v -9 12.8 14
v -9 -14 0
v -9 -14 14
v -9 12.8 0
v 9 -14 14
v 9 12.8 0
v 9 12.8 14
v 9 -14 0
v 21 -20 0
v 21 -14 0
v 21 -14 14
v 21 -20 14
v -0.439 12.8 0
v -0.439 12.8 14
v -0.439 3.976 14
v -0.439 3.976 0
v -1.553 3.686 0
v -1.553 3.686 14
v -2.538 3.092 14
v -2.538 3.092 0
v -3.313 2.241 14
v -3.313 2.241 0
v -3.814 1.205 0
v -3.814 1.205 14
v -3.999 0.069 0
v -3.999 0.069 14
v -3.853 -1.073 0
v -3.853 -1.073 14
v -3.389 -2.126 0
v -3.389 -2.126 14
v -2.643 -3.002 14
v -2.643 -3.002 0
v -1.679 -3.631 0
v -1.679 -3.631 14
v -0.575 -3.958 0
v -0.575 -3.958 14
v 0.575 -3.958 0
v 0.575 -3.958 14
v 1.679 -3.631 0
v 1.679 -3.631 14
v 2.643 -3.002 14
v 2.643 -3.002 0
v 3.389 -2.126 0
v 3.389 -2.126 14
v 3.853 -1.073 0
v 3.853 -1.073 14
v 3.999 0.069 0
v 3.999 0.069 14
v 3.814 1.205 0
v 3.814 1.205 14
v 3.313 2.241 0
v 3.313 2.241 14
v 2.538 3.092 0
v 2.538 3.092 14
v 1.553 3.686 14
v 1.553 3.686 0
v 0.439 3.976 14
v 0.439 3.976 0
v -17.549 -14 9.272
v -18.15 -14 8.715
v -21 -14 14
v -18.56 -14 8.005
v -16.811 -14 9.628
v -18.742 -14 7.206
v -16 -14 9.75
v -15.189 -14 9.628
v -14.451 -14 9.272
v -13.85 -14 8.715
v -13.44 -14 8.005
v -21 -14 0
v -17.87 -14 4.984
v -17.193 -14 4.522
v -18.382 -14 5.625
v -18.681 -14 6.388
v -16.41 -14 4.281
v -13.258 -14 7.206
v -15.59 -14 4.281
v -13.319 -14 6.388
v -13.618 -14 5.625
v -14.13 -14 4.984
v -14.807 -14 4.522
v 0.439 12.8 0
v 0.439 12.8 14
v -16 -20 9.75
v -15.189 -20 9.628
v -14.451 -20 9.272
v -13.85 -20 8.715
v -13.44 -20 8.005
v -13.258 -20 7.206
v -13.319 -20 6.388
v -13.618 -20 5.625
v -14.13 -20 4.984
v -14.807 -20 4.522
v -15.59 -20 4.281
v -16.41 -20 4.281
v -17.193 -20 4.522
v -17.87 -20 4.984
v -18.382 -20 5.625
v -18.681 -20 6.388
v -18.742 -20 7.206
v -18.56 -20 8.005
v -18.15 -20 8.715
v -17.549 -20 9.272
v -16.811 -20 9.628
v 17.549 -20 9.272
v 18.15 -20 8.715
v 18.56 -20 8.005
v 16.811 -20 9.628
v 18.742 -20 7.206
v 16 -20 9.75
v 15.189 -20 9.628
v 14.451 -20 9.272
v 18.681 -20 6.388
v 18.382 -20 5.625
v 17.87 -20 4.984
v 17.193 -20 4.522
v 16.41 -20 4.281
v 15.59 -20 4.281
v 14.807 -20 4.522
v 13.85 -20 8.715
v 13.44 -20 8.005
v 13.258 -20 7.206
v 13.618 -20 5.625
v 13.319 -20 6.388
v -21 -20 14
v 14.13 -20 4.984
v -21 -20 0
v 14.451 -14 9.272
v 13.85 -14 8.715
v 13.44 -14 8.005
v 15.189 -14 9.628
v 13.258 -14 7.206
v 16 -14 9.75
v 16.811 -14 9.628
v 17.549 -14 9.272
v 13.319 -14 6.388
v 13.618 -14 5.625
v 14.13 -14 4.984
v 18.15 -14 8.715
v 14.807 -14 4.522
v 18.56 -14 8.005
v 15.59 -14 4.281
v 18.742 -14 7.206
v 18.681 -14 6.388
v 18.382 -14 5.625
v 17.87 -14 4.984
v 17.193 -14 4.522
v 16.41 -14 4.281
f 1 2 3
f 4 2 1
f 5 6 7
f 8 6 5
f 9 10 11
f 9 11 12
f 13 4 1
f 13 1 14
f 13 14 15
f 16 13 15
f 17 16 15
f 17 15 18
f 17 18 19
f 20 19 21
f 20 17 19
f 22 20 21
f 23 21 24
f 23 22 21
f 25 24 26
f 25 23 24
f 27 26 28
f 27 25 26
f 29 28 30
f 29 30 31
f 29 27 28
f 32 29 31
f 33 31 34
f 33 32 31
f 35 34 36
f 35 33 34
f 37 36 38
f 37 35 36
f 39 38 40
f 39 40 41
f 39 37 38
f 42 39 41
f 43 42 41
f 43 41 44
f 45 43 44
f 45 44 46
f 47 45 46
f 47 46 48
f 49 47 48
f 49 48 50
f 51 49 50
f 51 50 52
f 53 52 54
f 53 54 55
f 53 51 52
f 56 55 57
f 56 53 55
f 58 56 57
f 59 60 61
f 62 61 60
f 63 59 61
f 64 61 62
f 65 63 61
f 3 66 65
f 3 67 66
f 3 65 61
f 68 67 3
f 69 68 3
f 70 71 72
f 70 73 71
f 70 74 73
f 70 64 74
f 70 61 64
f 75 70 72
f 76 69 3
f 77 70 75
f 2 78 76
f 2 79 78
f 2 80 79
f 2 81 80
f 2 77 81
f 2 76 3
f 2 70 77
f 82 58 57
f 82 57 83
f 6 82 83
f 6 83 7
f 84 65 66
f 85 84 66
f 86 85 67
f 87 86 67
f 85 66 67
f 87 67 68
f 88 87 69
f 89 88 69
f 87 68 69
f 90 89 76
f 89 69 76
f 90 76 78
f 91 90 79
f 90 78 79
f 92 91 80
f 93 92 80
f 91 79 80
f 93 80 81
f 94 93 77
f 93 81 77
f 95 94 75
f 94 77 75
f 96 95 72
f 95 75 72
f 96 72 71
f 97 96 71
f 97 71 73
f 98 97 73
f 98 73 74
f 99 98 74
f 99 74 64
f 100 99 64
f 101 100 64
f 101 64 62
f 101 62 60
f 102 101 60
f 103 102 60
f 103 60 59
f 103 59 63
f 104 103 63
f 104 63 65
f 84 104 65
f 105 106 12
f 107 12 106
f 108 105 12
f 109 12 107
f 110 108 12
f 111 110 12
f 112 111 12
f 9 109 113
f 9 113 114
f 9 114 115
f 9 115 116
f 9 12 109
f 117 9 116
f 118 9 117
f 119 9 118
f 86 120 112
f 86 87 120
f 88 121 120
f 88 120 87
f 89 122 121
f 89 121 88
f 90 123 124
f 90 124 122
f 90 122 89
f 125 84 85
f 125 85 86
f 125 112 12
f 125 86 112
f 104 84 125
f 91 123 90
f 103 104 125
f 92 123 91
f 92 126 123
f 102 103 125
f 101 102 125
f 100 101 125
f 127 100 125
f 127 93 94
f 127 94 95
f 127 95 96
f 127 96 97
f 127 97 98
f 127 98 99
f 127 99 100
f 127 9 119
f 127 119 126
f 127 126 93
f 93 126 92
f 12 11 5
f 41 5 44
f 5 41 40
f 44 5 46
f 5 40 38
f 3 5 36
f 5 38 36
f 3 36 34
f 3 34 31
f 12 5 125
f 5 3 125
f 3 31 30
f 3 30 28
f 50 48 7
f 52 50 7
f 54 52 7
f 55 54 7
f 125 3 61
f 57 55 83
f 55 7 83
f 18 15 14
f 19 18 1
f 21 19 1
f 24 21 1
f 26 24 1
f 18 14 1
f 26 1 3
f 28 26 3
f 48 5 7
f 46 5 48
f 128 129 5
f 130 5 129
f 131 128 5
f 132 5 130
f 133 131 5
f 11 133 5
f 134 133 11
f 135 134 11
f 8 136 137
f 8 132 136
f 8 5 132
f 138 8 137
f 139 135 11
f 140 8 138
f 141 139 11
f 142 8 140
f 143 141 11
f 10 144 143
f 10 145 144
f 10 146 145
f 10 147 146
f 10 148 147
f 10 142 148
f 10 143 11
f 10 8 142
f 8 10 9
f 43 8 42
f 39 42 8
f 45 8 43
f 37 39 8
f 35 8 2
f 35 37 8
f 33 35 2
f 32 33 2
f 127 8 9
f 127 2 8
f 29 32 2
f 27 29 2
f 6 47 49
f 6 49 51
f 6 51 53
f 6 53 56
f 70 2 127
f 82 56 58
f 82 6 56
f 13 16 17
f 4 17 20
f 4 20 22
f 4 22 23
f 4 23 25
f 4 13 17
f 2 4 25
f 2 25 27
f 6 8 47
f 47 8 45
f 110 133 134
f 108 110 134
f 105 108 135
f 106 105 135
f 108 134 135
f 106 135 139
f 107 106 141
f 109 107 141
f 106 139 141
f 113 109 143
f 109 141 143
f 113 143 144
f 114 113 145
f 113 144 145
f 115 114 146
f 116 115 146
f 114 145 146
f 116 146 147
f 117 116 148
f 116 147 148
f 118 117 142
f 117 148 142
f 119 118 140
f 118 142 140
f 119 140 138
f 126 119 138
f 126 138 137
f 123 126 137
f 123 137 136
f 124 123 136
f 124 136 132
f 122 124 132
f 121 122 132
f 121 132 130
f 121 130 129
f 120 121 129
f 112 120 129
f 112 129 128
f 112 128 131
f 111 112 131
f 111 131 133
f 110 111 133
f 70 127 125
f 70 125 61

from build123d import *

# Parameters (mm, degrees)
EXTRUDE_2_DEPTH     = 14
SKETCH_2_R          = 2.75
CUT_EXTRUDE_1_DEPTH = 37.813584449


with BuildPart() as part:
    # 草图1 → 凸台-拉伸2 (new body)
    with BuildSketch(Plane.XY):
        with BuildLine():
            Line((21, -20), (-21, -20))
            Line((-21, -20), (-21, -14))
            Line((-21, -14), (-9, -14))
            Line((-9, -14), (-9, 12.8))
            Line((-9, 12.8), (-0.438791817, 12.8))
            Line((-0.438791817, 12.8), (-0.438791817, 3.975859874))
            ThreePointArc((-0.438791817, 3.975859874), (0, -4), (0.438791817, 3.975859874))
            Line((0.438791817, 3.975859874), (0.438791817, 12.8))
            Line((0.438791817, 12.8), (9, 12.8))
            Line((9, 12.8), (9, -14))
            Line((9, -14), (21, -14))
            Line((21, -14), (21, -20))
        make_face()
    extrude(amount=EXTRUDE_2_DEPTH)

    # 草图2 → 切除-拉伸1 (cut, through all)
    with BuildSketch(Plane(origin=(0, -14, 0), x_dir=(1, 0, 0), z_dir=(0, 1, 0))):
        with Locations(Location((-16, -7, 0), (0, 0, 270))):
            Circle(SKETCH_2_R)
        with Locations(Location((16, -7, 0), (0, 0, 270))):
            Circle(SKETCH_2_R)
    extrude(amount=-CUT_EXTRUDE_1_DEPTH, mode=Mode.SUBTRACT)


solid = part.part
